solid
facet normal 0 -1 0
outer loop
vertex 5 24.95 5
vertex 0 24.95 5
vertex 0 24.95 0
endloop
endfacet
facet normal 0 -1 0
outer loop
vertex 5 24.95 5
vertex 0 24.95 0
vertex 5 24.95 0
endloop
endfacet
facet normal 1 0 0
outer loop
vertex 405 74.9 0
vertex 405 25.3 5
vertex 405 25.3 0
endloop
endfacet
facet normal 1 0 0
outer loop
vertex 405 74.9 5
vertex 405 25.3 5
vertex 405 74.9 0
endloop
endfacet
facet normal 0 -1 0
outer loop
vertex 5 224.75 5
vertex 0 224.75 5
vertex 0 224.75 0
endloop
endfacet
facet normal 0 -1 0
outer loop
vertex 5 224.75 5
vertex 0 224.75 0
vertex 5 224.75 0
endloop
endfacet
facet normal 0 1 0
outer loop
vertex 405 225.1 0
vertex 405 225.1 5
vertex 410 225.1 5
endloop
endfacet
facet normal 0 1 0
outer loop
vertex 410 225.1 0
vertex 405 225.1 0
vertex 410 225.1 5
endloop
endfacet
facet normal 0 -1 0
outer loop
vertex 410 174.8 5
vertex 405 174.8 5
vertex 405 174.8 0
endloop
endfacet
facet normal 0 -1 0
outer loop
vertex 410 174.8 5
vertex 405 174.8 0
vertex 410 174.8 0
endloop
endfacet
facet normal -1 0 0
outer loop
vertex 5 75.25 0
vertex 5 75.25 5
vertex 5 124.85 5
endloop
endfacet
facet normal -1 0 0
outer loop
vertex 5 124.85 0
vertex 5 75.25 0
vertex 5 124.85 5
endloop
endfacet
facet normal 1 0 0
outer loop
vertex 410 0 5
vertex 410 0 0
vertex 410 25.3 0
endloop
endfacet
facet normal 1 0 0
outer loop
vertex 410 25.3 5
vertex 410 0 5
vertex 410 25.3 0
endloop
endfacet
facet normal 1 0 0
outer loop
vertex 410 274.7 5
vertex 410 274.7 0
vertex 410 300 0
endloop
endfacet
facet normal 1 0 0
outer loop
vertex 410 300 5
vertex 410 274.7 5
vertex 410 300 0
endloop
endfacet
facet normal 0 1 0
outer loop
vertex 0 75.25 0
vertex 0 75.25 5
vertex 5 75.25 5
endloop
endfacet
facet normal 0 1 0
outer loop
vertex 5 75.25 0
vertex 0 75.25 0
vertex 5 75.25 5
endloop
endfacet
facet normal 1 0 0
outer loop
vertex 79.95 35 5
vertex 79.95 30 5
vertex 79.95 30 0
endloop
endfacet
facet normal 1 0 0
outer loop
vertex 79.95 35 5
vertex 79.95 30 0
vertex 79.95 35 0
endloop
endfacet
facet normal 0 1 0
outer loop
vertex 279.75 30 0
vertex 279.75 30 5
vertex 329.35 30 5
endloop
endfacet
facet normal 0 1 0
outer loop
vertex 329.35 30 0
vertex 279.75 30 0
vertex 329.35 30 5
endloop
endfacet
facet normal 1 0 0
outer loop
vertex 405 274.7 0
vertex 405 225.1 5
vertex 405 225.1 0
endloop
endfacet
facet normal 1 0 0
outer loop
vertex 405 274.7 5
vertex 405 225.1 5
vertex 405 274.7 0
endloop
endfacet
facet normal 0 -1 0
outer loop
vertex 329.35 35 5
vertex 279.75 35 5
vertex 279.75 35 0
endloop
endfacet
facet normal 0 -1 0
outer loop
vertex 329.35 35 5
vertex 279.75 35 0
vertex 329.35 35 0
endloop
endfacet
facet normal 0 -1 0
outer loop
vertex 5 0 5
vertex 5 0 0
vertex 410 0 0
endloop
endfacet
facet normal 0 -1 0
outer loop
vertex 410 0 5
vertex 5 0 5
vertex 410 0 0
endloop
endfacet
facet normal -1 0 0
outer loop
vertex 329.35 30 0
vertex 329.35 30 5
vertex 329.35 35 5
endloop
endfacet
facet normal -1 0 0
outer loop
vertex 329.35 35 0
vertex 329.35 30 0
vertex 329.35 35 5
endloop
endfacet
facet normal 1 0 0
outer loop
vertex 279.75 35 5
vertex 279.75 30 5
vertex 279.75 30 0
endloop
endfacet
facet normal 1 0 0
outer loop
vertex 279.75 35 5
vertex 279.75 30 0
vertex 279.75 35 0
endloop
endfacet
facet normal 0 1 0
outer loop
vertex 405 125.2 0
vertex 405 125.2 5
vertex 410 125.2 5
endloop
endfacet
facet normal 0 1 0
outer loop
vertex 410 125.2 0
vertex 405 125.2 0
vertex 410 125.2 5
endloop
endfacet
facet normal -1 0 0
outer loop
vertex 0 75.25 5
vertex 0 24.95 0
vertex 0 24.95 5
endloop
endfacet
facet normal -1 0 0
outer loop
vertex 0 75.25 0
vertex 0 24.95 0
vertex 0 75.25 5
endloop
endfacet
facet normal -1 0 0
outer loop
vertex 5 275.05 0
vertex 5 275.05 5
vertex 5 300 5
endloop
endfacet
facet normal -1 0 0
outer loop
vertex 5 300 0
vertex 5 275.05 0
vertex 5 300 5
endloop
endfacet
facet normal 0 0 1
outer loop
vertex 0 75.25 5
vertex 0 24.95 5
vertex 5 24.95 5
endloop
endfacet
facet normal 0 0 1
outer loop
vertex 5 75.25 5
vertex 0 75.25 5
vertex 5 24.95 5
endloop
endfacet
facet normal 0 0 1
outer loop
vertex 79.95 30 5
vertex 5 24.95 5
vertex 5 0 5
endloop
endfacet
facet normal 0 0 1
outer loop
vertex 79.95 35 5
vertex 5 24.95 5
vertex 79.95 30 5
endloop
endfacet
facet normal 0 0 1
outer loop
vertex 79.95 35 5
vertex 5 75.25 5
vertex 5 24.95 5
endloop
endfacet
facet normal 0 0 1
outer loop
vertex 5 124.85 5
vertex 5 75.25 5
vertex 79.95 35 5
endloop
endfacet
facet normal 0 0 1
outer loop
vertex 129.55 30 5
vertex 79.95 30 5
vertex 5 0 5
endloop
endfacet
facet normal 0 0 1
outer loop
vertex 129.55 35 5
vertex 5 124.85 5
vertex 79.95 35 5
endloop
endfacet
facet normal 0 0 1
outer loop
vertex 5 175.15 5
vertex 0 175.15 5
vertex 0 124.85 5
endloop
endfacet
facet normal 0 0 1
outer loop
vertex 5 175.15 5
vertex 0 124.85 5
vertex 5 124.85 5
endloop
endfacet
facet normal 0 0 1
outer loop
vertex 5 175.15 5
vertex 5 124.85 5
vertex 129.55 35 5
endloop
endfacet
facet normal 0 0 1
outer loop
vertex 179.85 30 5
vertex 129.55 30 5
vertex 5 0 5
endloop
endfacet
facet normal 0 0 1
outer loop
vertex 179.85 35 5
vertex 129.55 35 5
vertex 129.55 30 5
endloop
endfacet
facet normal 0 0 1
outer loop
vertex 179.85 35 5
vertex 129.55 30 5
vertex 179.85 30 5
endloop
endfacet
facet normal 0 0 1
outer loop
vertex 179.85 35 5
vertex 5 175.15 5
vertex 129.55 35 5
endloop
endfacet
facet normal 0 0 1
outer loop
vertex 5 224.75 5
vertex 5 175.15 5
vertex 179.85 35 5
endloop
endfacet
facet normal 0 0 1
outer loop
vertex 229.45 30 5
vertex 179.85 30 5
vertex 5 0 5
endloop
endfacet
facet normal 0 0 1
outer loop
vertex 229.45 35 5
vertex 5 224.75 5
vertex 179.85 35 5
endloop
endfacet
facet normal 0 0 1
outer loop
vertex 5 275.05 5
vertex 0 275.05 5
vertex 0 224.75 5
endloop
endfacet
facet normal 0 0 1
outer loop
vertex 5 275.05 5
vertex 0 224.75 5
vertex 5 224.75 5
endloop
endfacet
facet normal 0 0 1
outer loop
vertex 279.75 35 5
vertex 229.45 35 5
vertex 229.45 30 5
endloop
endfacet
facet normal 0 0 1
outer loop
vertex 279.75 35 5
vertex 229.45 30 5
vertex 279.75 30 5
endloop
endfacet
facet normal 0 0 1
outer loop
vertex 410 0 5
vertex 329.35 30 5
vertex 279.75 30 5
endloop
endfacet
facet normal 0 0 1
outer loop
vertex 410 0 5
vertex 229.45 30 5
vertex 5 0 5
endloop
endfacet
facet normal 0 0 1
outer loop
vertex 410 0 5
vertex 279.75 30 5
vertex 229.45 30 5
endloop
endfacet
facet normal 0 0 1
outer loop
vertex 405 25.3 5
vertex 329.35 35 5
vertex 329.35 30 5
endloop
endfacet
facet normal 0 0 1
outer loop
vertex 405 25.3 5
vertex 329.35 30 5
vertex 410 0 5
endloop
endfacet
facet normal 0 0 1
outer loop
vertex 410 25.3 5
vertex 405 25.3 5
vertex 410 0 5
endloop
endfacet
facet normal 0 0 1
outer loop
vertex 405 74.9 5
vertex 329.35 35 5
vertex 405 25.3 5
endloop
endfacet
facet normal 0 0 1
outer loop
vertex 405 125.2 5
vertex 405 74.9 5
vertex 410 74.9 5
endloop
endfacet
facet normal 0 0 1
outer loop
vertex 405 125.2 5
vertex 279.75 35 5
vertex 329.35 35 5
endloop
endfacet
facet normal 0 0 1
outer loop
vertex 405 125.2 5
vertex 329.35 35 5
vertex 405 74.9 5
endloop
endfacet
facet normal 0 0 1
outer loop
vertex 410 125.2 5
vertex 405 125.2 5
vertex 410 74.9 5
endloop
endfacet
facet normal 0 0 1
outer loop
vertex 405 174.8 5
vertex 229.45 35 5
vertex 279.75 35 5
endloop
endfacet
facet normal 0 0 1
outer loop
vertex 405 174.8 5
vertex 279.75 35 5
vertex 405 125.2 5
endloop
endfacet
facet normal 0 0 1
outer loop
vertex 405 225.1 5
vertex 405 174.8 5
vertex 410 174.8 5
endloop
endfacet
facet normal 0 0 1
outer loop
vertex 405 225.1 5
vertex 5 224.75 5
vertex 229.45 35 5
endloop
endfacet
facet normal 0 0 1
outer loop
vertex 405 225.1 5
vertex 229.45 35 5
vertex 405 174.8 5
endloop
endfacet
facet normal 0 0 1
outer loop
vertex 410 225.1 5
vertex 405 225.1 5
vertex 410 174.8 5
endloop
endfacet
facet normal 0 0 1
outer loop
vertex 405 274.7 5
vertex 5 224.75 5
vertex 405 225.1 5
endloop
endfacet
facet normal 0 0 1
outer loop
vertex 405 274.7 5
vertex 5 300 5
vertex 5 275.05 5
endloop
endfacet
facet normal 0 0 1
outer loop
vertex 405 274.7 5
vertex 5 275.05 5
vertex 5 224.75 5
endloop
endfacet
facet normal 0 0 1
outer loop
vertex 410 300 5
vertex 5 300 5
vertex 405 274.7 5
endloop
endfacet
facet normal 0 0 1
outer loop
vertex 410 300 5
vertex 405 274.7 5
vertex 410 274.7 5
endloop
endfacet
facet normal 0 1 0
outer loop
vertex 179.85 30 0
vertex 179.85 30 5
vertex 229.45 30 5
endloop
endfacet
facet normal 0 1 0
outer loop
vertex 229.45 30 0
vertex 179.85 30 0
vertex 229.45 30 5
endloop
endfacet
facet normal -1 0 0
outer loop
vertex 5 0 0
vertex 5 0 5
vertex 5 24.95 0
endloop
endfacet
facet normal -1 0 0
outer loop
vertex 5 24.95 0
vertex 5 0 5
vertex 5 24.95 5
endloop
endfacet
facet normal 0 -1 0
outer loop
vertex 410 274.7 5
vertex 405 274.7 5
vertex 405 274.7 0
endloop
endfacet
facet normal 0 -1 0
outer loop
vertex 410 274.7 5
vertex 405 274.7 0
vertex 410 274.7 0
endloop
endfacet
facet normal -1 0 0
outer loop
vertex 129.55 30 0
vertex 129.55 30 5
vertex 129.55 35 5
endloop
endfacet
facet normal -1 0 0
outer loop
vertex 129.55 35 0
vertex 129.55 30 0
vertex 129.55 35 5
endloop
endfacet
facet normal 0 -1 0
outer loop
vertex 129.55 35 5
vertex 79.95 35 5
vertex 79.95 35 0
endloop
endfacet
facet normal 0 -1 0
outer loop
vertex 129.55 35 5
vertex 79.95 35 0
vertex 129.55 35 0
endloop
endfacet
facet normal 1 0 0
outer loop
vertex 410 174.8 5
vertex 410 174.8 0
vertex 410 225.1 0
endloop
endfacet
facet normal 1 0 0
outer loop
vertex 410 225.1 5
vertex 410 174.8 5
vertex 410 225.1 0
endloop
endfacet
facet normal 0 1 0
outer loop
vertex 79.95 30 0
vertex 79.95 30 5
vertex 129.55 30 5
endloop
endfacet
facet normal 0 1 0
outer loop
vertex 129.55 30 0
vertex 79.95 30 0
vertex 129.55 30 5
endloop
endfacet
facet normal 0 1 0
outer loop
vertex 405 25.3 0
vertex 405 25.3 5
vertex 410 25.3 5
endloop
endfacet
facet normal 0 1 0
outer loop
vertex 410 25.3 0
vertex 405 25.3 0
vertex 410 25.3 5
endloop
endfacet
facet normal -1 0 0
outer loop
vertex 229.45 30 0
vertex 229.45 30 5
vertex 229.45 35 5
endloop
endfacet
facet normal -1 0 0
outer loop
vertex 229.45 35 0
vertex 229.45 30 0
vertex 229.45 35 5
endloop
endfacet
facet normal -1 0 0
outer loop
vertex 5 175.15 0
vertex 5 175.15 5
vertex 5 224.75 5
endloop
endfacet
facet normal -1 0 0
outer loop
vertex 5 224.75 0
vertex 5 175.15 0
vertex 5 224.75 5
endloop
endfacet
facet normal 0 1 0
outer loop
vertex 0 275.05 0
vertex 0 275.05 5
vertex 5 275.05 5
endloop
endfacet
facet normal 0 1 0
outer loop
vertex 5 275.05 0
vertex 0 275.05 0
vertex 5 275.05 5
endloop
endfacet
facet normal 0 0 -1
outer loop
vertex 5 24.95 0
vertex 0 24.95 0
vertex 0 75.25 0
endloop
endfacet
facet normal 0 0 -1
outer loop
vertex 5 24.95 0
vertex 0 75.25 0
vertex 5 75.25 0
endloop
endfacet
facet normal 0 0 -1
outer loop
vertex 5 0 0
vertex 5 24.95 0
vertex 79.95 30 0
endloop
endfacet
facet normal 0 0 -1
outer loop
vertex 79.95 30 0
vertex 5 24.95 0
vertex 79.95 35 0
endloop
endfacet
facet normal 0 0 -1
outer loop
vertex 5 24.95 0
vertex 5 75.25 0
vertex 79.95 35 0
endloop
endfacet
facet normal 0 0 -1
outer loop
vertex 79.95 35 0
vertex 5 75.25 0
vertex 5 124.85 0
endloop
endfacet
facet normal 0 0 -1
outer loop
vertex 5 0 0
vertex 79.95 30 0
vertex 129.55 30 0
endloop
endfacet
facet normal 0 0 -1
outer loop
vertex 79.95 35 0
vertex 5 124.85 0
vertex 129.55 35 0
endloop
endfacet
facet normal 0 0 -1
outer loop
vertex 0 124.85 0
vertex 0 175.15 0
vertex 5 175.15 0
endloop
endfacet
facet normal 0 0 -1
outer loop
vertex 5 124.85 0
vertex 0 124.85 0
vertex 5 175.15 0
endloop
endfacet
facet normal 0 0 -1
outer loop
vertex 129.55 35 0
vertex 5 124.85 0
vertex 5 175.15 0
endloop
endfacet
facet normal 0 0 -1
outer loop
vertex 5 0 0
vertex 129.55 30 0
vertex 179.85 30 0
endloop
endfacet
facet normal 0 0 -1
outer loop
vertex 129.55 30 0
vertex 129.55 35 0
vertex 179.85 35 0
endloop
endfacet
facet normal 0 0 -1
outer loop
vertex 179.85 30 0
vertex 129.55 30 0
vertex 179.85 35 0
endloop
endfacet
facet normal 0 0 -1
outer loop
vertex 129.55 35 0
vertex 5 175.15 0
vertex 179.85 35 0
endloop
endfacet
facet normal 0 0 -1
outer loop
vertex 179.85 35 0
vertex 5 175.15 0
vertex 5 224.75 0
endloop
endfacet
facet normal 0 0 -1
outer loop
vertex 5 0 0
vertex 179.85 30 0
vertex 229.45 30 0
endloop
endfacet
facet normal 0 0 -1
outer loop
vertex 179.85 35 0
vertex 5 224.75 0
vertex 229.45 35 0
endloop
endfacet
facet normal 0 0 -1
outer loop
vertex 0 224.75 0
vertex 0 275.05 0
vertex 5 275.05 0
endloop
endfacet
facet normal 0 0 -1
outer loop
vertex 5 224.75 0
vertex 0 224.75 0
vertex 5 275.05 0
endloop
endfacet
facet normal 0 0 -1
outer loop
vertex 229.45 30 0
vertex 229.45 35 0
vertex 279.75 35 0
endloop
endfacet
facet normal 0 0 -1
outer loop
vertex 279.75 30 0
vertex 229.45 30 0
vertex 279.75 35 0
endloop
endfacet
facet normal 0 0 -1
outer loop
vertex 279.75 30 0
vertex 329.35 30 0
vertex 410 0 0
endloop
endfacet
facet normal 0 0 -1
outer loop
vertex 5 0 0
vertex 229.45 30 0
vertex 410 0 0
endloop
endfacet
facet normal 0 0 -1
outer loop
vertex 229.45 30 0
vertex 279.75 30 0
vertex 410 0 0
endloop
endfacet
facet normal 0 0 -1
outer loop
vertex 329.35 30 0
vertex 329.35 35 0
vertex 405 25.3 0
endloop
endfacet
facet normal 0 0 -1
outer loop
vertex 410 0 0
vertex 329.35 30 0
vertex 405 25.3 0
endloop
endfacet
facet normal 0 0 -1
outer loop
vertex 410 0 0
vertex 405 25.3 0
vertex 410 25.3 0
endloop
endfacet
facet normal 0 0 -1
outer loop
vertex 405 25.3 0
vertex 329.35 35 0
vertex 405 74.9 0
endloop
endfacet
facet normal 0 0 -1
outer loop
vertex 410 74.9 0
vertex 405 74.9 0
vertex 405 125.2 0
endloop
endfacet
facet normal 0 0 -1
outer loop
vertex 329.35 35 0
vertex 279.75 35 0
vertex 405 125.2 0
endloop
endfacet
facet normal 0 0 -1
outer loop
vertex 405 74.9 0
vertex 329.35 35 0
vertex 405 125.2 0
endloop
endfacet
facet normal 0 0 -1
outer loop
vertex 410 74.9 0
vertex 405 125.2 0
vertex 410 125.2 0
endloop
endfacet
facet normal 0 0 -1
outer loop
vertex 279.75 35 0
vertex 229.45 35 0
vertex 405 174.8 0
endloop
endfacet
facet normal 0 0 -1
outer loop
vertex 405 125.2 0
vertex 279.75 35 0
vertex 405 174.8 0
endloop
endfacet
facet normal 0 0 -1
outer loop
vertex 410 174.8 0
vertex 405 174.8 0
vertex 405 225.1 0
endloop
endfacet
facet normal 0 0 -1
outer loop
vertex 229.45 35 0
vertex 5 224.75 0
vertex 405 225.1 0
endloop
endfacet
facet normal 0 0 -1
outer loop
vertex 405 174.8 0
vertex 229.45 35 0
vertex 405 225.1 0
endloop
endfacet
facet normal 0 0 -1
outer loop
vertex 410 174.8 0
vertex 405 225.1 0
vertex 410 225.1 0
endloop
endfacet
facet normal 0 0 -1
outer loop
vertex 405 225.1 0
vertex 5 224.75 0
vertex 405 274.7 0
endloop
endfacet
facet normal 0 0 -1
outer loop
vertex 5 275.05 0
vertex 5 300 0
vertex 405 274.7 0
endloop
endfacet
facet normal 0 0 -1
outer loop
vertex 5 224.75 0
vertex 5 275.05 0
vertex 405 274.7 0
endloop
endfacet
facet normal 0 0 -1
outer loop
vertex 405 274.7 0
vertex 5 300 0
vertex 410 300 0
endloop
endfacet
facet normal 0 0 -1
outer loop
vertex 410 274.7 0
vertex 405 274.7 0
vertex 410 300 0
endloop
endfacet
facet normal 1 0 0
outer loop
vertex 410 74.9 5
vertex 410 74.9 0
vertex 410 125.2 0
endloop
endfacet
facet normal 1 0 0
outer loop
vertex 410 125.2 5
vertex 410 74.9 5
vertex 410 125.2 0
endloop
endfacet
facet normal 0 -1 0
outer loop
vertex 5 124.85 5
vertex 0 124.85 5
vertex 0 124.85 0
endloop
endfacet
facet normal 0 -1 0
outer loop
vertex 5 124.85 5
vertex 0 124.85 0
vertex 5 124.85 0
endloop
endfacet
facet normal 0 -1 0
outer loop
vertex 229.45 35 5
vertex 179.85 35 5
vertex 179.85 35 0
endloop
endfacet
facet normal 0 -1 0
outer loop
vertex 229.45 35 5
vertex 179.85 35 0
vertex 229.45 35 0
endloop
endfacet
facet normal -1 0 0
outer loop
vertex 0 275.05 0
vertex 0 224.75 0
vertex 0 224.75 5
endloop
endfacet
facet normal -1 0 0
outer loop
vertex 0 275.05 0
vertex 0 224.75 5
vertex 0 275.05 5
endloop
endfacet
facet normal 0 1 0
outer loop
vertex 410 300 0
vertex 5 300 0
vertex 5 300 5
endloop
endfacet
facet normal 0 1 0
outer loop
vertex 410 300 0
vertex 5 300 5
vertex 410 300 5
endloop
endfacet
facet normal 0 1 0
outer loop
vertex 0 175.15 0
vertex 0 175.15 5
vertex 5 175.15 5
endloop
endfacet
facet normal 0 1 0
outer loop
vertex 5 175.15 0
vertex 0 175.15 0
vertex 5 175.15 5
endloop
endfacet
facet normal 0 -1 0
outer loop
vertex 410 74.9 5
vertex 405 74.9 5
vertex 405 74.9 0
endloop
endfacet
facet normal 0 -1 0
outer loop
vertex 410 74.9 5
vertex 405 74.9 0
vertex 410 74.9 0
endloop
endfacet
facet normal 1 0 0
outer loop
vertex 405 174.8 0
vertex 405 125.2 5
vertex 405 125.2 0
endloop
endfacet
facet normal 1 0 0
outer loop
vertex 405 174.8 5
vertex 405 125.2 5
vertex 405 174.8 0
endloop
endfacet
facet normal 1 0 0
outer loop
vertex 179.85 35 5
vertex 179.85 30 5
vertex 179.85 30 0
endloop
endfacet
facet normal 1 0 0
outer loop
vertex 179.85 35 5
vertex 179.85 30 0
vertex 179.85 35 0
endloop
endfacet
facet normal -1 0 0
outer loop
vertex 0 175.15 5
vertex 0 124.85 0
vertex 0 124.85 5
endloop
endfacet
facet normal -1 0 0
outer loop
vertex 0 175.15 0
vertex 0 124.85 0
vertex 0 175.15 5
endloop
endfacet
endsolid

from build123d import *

# Parameters (mm, degrees)
SKIZZE1_W                       = 410
SKIZZE1_H                       = 300
AUFSATZ_LINEAR_AUSTRAGEN1_DEPTH = 5
SKIZZE2_W                       = 46.676040128
SKIZZE2_H                       = 49.6
SCHNITT_LINEAR_AUSTRAGEN1_DEPTH = 5
LINEARES_MUSTER1_COUNT          = 4
LINEARES_MUSTER1_PITCH          = 99.9
SKIZZE3_W                       = 27.663601369
SKIZZE3_H                       = 49.6
SCHNITT_LINEAR_AUSTRAGEN2_DEPTH = 5
LINEARES_MUSTER2_COUNT          = 3
LINEARES_MUSTER2_PITCH          = 99.9
SKIZZE4_W                       = 49.6
SKIZZE4_H                       = 5
SCHNITT_LINEAR_AUSTRAGEN3_DEPTH = 5
LINEARES_MUSTER3_COUNT          = 3
LINEARES_MUSTER3_PITCH          = 99.9


with BuildPart() as part:
    # Skizze1 → Aufsatz-Linear austragen1 (new body)
    with BuildSketch(Plane.XY):
        with Locations((205, 150)):
            Rectangle(SKIZZE1_W, SKIZZE1_H)
    extrude(amount=AUFSATZ_LINEAR_AUSTRAGEN1_DEPTH)

    # Skizze2 → Schnitt-Linear austragen1 (cut)
    with BuildSketch(Plane.XY.offset(5)):
        with Locations((-18.338020064, 299.85)):
            Rectangle(SKIZZE2_W, SKIZZE2_H)
    schnitt_linear_austragen1 = extrude(amount=-SCHNITT_LINEAR_AUSTRAGEN1_DEPTH, mode=Mode.SUBTRACT)

    # Lineares Muster1: Schnitt-Linear austragen1 ×4
    with Locations(*[(0, -i * LINEARES_MUSTER1_PITCH, 0) for i in range(1, LINEARES_MUSTER1_COUNT)]):
        add(schnitt_linear_austragen1, mode=Mode.SUBTRACT)

    # Skizze3 → Schnitt-Linear austragen2 (cut)
    with BuildSketch(Plane.XY.offset(5)):
        with Locations((418.831800685, 249.9)):
            Rectangle(SKIZZE3_W, SKIZZE3_H)
    schnitt_linear_austragen2 = extrude(amount=-SCHNITT_LINEAR_AUSTRAGEN2_DEPTH, mode=Mode.SUBTRACT)

    # Lineares Muster2: Schnitt-Linear austragen2 ×3
    with Locations(*[(0, -i * LINEARES_MUSTER2_PITCH, 0) for i in range(1, LINEARES_MUSTER2_COUNT)]):
        add(schnitt_linear_austragen2, mode=Mode.SUBTRACT)

    # Skizze4 → Schnitt-Linear austragen3 (cut)
    with BuildSketch(Plane.XY.offset(5)):
        with Locations((104.75, 32.5)):
            Rectangle(SKIZZE4_W, SKIZZE4_H)
    schnitt_linear_austragen3 = extrude(amount=-SCHNITT_LINEAR_AUSTRAGEN3_DEPTH, mode=Mode.SUBTRACT)

    # Lineares Muster3: Schnitt-Linear austragen3 ×3
    with Locations(*[(i * LINEARES_MUSTER3_PITCH, 0, 0) for i in range(1, LINEARES_MUSTER3_COUNT)]):
        add(schnitt_linear_austragen3, mode=Mode.SUBTRACT)


solid = part.part
